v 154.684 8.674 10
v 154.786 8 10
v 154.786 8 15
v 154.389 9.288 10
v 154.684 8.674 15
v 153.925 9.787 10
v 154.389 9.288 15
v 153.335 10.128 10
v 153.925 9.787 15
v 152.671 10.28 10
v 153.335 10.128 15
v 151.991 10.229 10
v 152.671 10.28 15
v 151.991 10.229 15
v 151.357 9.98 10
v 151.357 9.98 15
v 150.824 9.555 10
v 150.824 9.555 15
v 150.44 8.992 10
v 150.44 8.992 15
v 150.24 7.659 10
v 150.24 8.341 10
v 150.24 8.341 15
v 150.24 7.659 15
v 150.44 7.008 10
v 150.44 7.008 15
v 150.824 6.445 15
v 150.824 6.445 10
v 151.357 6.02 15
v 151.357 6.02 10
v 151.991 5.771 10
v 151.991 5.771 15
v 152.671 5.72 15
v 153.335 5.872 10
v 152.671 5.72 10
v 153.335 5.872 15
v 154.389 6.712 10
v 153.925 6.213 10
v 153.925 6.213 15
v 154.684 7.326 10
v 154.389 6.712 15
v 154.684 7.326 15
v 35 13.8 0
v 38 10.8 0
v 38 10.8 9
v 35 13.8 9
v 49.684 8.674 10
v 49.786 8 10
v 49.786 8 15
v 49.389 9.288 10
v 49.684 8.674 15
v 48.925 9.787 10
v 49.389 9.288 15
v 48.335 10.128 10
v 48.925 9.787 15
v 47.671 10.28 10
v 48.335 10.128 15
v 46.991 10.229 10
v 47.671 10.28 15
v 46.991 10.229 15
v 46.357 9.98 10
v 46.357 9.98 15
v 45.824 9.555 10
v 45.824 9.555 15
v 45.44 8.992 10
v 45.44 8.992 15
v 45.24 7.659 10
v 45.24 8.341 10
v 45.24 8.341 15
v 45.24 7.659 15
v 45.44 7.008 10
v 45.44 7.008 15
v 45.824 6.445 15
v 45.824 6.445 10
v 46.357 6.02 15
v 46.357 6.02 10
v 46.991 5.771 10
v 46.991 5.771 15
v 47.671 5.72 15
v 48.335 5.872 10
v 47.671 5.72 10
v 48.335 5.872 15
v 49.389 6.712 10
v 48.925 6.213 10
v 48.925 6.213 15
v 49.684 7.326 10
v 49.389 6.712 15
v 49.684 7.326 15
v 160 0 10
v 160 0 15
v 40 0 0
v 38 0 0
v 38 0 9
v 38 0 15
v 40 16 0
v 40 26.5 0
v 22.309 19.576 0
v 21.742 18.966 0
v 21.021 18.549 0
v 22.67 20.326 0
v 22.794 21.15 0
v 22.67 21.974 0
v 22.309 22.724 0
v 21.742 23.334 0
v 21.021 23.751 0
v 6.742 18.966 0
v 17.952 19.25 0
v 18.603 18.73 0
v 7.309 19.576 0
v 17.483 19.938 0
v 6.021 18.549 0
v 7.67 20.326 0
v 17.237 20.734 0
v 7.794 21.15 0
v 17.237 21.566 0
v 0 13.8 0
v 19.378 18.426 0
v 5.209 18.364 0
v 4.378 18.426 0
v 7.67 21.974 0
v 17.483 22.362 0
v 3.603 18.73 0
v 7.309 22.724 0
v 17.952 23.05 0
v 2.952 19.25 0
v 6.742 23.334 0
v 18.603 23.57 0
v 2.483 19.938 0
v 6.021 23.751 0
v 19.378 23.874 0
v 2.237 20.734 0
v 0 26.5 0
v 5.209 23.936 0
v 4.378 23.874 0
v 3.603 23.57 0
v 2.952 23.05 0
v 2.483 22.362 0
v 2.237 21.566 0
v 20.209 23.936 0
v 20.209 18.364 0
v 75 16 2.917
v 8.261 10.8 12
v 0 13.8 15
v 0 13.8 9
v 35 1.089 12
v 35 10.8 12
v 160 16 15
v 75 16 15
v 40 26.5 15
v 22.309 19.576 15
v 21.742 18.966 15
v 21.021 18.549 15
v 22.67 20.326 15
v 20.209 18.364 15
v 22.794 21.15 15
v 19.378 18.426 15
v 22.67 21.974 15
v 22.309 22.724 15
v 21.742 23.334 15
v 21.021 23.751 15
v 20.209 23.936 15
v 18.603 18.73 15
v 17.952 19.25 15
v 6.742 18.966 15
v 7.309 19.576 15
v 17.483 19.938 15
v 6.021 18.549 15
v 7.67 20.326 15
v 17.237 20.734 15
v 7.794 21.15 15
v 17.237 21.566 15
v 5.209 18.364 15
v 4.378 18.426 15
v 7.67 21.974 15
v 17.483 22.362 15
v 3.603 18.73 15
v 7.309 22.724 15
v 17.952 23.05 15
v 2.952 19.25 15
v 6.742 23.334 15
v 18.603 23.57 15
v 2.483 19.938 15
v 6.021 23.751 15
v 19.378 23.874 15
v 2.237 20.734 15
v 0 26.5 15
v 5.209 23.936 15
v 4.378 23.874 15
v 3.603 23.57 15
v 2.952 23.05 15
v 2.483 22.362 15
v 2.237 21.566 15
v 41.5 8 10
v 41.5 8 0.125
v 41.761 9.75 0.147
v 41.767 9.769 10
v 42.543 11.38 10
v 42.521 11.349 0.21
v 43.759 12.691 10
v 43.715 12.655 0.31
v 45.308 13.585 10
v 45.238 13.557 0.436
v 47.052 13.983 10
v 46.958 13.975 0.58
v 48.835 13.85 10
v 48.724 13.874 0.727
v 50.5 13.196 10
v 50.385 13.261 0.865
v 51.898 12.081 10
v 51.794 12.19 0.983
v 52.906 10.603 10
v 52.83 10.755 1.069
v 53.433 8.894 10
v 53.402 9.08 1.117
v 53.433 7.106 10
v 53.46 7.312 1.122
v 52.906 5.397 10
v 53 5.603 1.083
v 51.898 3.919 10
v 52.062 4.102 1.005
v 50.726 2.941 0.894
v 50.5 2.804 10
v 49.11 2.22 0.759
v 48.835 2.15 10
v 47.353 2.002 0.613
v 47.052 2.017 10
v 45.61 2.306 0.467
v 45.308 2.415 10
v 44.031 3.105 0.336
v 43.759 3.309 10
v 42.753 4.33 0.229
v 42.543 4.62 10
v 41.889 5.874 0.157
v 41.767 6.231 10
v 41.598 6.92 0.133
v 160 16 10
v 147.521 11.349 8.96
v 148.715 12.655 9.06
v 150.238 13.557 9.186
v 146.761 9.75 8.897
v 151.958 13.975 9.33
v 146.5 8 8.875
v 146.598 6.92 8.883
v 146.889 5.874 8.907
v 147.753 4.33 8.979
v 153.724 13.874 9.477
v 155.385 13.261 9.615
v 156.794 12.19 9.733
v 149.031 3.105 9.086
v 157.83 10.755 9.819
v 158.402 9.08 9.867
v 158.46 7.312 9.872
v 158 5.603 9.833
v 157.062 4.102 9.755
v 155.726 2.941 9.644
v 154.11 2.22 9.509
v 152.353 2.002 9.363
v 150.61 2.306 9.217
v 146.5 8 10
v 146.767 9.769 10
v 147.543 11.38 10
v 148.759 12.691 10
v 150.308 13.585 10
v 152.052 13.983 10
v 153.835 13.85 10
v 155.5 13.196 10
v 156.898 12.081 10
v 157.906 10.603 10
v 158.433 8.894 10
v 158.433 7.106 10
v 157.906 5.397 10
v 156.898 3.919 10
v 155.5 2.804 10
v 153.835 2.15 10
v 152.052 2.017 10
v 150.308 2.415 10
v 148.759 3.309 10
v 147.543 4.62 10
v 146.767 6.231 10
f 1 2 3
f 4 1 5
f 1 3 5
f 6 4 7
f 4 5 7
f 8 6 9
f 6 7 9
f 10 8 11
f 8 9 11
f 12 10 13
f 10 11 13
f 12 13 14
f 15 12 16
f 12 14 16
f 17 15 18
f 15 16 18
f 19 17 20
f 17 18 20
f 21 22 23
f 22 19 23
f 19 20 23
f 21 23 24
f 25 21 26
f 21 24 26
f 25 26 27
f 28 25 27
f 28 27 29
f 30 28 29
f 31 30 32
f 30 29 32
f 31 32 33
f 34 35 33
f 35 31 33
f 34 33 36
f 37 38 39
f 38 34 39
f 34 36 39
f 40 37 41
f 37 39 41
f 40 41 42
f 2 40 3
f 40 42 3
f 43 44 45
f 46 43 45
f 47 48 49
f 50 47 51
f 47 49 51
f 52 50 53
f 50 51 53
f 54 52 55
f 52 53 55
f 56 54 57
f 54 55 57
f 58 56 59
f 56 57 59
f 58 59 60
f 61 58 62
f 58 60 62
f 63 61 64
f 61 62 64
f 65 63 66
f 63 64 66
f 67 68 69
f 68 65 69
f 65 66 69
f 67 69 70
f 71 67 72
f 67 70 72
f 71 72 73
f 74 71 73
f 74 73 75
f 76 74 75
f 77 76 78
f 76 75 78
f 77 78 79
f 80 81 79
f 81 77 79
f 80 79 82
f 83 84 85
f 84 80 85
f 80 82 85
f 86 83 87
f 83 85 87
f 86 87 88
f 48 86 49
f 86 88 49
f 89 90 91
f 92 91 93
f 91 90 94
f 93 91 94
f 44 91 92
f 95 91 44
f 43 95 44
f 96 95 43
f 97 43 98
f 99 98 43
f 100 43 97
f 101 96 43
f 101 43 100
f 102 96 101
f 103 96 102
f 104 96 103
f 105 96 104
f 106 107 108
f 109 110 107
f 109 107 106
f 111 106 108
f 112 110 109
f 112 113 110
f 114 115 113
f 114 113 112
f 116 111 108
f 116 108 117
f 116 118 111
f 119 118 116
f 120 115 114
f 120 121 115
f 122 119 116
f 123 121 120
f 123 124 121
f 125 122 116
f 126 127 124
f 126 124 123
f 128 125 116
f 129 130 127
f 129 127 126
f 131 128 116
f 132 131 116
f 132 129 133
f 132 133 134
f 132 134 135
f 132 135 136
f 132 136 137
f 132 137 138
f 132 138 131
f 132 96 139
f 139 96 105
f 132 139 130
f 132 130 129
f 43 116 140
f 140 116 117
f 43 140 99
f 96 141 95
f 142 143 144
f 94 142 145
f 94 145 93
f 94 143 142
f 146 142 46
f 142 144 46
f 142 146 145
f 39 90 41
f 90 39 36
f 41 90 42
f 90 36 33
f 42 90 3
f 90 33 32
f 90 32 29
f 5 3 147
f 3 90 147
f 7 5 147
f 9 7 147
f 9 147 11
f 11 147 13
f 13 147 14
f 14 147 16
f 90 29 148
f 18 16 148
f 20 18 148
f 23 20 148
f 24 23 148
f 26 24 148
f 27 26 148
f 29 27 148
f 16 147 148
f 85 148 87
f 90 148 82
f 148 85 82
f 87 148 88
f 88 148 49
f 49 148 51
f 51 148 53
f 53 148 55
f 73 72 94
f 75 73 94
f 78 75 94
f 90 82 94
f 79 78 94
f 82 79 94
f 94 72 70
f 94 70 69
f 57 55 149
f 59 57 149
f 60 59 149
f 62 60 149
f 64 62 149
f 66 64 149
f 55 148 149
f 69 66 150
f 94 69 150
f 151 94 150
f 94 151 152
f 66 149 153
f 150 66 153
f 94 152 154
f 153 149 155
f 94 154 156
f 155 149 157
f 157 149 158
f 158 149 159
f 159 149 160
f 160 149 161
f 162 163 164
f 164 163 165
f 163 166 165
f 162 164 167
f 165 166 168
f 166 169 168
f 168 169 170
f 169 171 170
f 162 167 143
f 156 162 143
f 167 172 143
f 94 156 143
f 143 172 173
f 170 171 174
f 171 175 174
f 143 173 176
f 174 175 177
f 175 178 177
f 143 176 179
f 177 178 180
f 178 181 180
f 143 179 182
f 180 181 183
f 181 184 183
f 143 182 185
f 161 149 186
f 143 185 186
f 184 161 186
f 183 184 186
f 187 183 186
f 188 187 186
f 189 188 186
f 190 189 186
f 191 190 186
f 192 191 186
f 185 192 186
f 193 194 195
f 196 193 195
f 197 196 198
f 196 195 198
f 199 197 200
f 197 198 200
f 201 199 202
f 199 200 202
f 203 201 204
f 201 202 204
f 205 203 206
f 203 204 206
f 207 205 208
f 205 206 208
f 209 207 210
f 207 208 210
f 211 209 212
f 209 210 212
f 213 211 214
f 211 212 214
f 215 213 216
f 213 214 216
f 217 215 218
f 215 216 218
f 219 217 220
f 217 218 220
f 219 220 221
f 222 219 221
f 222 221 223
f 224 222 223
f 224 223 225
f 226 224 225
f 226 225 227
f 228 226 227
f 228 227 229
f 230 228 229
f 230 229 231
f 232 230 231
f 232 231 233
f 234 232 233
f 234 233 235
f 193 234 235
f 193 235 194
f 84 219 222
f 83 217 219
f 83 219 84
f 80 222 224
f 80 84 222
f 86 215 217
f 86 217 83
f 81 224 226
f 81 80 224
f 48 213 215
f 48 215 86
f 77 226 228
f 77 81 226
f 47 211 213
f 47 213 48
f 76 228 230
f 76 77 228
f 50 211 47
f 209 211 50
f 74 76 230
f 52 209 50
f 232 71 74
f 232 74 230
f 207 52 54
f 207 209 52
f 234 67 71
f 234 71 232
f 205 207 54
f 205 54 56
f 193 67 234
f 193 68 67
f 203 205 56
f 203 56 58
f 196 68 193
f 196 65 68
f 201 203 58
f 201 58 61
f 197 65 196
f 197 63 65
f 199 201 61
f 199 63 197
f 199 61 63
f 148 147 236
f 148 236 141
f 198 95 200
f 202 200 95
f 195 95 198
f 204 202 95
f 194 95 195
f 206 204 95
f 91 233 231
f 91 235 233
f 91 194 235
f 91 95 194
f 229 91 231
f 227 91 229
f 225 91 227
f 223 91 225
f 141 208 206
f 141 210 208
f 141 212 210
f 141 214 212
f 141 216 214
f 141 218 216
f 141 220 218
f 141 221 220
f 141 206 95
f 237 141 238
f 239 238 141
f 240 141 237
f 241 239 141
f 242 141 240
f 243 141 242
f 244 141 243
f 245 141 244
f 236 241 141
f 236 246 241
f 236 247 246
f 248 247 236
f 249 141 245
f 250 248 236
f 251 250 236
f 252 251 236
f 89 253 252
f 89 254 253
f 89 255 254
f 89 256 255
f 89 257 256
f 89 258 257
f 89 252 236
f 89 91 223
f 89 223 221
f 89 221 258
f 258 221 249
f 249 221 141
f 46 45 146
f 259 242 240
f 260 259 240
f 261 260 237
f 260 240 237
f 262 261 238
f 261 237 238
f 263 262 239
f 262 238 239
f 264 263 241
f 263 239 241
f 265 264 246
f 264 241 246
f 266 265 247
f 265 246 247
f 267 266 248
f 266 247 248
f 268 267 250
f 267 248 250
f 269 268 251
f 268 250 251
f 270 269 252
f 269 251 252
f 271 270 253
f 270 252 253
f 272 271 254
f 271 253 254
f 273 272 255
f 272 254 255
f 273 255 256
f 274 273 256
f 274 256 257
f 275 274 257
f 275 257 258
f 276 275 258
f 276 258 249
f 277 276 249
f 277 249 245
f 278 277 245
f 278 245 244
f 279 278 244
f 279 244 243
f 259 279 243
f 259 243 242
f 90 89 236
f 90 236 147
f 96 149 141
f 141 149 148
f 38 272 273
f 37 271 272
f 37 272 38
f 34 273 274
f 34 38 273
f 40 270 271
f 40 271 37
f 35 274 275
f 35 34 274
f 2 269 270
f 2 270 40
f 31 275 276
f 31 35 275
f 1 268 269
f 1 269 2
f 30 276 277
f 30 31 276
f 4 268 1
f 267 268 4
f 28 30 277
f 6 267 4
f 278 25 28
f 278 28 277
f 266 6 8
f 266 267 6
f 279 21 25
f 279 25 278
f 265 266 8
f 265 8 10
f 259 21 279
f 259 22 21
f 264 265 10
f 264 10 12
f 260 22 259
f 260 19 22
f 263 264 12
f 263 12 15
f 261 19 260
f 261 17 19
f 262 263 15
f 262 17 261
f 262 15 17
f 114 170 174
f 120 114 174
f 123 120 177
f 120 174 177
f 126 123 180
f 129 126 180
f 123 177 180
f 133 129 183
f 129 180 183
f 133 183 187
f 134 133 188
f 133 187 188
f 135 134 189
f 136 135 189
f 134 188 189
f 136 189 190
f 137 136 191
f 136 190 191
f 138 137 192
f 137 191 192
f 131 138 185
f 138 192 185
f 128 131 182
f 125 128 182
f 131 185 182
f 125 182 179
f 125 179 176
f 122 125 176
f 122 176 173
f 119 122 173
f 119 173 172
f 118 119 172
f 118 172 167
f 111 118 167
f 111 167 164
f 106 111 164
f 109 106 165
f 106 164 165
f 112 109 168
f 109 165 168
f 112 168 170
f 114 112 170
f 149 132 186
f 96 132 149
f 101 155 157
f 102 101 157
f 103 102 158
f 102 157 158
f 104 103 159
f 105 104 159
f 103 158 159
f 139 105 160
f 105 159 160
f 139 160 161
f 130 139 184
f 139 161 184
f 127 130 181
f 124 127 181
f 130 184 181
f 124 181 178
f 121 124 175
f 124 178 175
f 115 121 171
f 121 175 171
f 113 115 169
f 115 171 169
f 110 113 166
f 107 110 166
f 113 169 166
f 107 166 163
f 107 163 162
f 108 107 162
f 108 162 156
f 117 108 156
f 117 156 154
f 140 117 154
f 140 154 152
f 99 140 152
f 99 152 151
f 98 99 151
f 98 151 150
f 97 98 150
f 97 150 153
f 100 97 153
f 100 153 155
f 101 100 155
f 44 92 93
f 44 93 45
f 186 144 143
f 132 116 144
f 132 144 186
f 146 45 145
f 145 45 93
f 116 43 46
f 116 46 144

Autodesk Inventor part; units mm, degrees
ref_plane "YZ Plane" through (0, 0, 0) normal (1, 0, 0) x (0, 1, 0)
ref_plane "XZ Plane" through (0, 0, 0) normal (0, 1, 0) x (-1, 0, 0)
ref_plane "XY Plane" through (0, 0, 0) normal (0, 0, 1) x (1, 0, 0)
sketch "Sketch1" plane through (0, 0, 0) normal (0, 1, 0) x (-1, 0, 0)
  line L0 (0, 0) -> (-40, 0)
  line L1 (-40, 0) -> (-160, 10)
  line L2 (-160, 10) -> (-160, 15)
  line L3 (-160, 15) -> (0, 15)
  line L4 (0, 15) -> (0, 0)
  point P0 (-160, 12.5)
  dimension "d0" = 15
  dimension "d1" = 40
  dimension "d2" = 5
  dimension "d3" = 120
extrude "Extrusion1" add sketch "Sketch1" along normal blind 16
sketch "Sketch2" plane through (0, 0, 15) normal (0, 0, 1) x (1, 0, 0)
  circle A0 centre (152.5, 8) radius 2.286
  circle A1 centre (47.5, 8) radius 2.286
  line L0 (160, 0) -> (160, 16) projected
  point P0 (0, 0)
  point P1 (160, 8)
  dimension "d6" = 4.572
  dimension "d7" = 7.5
  dimension "d8" = 105
extrude "Extrusion2" cut sketch "Sketch2" against normal blind 20
sketch "Sketch3" plane through (40, 0, 0) normal (0, 0, -1) x (-1, 0, 0)
  circle A0 centre (-112.5, 8) radius 2.286 projected
  circle A1 centre (-112.5, 8) radius 6
  circle A2 centre (-7.5, 8) radius 2.286 projected
  circle A3 centre (-7.5, 8) radius 6
  point P0 (40, 0)
  dimension "d11" = 12
extrude "Extrusion3" cut sketch "Sketch3" against normal up to surface (10 mm away)
sketch "Sketch4" plane through (40, 0, 0) normal (0, 0, -1) x (-1, 0, 0)
  line L0 (40, 0) -> (40, 16) projected
  line L1 (40, 0) -> (40, 16) projected
  line L2 (40, 16) -> (40, 26.5)
  line L3 (40, 26.5) -> (0, 26.5)
  line L4 (0, 26.5) -> (0, 16)
  line L5 (0, 0) -> (0, 16) projected
  line L6 (0, 0) -> (40, 0) projected
  line L7 (40, 0) -> (40, 16) projected
  line L8 (0, 16) -> (40, 16) projected
  point P0 (40, 8)
  dimension "d14" = 18.5
extrude "Extrusion4" add sketch "Sketch4" against normal up to surface (15 mm away) contours L8 L4 L3 L2
sketch "Sketch5" plane through (40, 0, 0) normal (0, 0, -1) x (-1, 0, 0)
  line L0 (40, 0) -> (-120, 0) projected
  line L1 (2, 0) -> (2, 13.8)
  line L2 (2, 13.8) -> (40, 13.8)
  line L3 (40, 0) -> (40, 26.5) projected
  line L4 (40, 26.5) -> (0, 26.5) projected
  line L5 (0, 26.5) -> (0, 16) projected
  dimension "d17" = 12.7
  dimension "d18" = 2
extrude "Extrusion5" cut sketch "Sketch5" against normal through all
sketch "Sketch6" plane through (40, 0, 15) normal (0, 0, -1) x (-1, 0, 0)
  line L0 (40, 13.8) -> (40, 26.5) projected
  line L1 (2, 13.8) -> (2, 0) projected
  line L2 (40, 13.8) -> (2, 0)
  line L3 (2, 13.8) -> (40, 13.8) projected
  point P0 (40, 0)
extrude "Extrusion6" add sketch "Sketch6" along normal blind 3
chamfer "Chamfer1" distance 3 angle 45 3 edges at (38, 6.9, 12) (38, 13.8, 6) (19, 13.8, 12)
sketch "Sketch7" plane through (160, 0, 15) normal (0, 0, 1) x (1, 0, 0)
  line L0 (-120, 26.5) -> (-120, 16) projected
  line L1 (-120, 26.5) -> (-85, 16)
  line L2 (-120, 16) -> (0, 16) projected
  point P0 (-160, 0)
  dimension "d29" = 35
extrude "Extrusion7" add sketch "Sketch7" against normal up to surface surface through (160, 0, 10) normal (0.0830455, 0, -0.9965458)
sketch "Sketch9" plane through (160, 0, 15) normal (0, 0, 1) x (1, 0, 0)
  circle A0 centre (-140, 21.15) radius 2.794
  circle A1 centre (-155, 21.15) radius 2.794
  line L0 (-160, 13.8) -> (-160, 26.5) projected
  point P0 (-160, 0)
  point P1 (-160, 15.8)
  point P2 (-160, 21.15)
  dimension "d32" = 5.588
  dimension "d33" = 15
  dimension "d34" = 5
extrude "Extrusion8" cut sketch "Sketch9" against normal through all
properties part number "Fan_side_mount"
